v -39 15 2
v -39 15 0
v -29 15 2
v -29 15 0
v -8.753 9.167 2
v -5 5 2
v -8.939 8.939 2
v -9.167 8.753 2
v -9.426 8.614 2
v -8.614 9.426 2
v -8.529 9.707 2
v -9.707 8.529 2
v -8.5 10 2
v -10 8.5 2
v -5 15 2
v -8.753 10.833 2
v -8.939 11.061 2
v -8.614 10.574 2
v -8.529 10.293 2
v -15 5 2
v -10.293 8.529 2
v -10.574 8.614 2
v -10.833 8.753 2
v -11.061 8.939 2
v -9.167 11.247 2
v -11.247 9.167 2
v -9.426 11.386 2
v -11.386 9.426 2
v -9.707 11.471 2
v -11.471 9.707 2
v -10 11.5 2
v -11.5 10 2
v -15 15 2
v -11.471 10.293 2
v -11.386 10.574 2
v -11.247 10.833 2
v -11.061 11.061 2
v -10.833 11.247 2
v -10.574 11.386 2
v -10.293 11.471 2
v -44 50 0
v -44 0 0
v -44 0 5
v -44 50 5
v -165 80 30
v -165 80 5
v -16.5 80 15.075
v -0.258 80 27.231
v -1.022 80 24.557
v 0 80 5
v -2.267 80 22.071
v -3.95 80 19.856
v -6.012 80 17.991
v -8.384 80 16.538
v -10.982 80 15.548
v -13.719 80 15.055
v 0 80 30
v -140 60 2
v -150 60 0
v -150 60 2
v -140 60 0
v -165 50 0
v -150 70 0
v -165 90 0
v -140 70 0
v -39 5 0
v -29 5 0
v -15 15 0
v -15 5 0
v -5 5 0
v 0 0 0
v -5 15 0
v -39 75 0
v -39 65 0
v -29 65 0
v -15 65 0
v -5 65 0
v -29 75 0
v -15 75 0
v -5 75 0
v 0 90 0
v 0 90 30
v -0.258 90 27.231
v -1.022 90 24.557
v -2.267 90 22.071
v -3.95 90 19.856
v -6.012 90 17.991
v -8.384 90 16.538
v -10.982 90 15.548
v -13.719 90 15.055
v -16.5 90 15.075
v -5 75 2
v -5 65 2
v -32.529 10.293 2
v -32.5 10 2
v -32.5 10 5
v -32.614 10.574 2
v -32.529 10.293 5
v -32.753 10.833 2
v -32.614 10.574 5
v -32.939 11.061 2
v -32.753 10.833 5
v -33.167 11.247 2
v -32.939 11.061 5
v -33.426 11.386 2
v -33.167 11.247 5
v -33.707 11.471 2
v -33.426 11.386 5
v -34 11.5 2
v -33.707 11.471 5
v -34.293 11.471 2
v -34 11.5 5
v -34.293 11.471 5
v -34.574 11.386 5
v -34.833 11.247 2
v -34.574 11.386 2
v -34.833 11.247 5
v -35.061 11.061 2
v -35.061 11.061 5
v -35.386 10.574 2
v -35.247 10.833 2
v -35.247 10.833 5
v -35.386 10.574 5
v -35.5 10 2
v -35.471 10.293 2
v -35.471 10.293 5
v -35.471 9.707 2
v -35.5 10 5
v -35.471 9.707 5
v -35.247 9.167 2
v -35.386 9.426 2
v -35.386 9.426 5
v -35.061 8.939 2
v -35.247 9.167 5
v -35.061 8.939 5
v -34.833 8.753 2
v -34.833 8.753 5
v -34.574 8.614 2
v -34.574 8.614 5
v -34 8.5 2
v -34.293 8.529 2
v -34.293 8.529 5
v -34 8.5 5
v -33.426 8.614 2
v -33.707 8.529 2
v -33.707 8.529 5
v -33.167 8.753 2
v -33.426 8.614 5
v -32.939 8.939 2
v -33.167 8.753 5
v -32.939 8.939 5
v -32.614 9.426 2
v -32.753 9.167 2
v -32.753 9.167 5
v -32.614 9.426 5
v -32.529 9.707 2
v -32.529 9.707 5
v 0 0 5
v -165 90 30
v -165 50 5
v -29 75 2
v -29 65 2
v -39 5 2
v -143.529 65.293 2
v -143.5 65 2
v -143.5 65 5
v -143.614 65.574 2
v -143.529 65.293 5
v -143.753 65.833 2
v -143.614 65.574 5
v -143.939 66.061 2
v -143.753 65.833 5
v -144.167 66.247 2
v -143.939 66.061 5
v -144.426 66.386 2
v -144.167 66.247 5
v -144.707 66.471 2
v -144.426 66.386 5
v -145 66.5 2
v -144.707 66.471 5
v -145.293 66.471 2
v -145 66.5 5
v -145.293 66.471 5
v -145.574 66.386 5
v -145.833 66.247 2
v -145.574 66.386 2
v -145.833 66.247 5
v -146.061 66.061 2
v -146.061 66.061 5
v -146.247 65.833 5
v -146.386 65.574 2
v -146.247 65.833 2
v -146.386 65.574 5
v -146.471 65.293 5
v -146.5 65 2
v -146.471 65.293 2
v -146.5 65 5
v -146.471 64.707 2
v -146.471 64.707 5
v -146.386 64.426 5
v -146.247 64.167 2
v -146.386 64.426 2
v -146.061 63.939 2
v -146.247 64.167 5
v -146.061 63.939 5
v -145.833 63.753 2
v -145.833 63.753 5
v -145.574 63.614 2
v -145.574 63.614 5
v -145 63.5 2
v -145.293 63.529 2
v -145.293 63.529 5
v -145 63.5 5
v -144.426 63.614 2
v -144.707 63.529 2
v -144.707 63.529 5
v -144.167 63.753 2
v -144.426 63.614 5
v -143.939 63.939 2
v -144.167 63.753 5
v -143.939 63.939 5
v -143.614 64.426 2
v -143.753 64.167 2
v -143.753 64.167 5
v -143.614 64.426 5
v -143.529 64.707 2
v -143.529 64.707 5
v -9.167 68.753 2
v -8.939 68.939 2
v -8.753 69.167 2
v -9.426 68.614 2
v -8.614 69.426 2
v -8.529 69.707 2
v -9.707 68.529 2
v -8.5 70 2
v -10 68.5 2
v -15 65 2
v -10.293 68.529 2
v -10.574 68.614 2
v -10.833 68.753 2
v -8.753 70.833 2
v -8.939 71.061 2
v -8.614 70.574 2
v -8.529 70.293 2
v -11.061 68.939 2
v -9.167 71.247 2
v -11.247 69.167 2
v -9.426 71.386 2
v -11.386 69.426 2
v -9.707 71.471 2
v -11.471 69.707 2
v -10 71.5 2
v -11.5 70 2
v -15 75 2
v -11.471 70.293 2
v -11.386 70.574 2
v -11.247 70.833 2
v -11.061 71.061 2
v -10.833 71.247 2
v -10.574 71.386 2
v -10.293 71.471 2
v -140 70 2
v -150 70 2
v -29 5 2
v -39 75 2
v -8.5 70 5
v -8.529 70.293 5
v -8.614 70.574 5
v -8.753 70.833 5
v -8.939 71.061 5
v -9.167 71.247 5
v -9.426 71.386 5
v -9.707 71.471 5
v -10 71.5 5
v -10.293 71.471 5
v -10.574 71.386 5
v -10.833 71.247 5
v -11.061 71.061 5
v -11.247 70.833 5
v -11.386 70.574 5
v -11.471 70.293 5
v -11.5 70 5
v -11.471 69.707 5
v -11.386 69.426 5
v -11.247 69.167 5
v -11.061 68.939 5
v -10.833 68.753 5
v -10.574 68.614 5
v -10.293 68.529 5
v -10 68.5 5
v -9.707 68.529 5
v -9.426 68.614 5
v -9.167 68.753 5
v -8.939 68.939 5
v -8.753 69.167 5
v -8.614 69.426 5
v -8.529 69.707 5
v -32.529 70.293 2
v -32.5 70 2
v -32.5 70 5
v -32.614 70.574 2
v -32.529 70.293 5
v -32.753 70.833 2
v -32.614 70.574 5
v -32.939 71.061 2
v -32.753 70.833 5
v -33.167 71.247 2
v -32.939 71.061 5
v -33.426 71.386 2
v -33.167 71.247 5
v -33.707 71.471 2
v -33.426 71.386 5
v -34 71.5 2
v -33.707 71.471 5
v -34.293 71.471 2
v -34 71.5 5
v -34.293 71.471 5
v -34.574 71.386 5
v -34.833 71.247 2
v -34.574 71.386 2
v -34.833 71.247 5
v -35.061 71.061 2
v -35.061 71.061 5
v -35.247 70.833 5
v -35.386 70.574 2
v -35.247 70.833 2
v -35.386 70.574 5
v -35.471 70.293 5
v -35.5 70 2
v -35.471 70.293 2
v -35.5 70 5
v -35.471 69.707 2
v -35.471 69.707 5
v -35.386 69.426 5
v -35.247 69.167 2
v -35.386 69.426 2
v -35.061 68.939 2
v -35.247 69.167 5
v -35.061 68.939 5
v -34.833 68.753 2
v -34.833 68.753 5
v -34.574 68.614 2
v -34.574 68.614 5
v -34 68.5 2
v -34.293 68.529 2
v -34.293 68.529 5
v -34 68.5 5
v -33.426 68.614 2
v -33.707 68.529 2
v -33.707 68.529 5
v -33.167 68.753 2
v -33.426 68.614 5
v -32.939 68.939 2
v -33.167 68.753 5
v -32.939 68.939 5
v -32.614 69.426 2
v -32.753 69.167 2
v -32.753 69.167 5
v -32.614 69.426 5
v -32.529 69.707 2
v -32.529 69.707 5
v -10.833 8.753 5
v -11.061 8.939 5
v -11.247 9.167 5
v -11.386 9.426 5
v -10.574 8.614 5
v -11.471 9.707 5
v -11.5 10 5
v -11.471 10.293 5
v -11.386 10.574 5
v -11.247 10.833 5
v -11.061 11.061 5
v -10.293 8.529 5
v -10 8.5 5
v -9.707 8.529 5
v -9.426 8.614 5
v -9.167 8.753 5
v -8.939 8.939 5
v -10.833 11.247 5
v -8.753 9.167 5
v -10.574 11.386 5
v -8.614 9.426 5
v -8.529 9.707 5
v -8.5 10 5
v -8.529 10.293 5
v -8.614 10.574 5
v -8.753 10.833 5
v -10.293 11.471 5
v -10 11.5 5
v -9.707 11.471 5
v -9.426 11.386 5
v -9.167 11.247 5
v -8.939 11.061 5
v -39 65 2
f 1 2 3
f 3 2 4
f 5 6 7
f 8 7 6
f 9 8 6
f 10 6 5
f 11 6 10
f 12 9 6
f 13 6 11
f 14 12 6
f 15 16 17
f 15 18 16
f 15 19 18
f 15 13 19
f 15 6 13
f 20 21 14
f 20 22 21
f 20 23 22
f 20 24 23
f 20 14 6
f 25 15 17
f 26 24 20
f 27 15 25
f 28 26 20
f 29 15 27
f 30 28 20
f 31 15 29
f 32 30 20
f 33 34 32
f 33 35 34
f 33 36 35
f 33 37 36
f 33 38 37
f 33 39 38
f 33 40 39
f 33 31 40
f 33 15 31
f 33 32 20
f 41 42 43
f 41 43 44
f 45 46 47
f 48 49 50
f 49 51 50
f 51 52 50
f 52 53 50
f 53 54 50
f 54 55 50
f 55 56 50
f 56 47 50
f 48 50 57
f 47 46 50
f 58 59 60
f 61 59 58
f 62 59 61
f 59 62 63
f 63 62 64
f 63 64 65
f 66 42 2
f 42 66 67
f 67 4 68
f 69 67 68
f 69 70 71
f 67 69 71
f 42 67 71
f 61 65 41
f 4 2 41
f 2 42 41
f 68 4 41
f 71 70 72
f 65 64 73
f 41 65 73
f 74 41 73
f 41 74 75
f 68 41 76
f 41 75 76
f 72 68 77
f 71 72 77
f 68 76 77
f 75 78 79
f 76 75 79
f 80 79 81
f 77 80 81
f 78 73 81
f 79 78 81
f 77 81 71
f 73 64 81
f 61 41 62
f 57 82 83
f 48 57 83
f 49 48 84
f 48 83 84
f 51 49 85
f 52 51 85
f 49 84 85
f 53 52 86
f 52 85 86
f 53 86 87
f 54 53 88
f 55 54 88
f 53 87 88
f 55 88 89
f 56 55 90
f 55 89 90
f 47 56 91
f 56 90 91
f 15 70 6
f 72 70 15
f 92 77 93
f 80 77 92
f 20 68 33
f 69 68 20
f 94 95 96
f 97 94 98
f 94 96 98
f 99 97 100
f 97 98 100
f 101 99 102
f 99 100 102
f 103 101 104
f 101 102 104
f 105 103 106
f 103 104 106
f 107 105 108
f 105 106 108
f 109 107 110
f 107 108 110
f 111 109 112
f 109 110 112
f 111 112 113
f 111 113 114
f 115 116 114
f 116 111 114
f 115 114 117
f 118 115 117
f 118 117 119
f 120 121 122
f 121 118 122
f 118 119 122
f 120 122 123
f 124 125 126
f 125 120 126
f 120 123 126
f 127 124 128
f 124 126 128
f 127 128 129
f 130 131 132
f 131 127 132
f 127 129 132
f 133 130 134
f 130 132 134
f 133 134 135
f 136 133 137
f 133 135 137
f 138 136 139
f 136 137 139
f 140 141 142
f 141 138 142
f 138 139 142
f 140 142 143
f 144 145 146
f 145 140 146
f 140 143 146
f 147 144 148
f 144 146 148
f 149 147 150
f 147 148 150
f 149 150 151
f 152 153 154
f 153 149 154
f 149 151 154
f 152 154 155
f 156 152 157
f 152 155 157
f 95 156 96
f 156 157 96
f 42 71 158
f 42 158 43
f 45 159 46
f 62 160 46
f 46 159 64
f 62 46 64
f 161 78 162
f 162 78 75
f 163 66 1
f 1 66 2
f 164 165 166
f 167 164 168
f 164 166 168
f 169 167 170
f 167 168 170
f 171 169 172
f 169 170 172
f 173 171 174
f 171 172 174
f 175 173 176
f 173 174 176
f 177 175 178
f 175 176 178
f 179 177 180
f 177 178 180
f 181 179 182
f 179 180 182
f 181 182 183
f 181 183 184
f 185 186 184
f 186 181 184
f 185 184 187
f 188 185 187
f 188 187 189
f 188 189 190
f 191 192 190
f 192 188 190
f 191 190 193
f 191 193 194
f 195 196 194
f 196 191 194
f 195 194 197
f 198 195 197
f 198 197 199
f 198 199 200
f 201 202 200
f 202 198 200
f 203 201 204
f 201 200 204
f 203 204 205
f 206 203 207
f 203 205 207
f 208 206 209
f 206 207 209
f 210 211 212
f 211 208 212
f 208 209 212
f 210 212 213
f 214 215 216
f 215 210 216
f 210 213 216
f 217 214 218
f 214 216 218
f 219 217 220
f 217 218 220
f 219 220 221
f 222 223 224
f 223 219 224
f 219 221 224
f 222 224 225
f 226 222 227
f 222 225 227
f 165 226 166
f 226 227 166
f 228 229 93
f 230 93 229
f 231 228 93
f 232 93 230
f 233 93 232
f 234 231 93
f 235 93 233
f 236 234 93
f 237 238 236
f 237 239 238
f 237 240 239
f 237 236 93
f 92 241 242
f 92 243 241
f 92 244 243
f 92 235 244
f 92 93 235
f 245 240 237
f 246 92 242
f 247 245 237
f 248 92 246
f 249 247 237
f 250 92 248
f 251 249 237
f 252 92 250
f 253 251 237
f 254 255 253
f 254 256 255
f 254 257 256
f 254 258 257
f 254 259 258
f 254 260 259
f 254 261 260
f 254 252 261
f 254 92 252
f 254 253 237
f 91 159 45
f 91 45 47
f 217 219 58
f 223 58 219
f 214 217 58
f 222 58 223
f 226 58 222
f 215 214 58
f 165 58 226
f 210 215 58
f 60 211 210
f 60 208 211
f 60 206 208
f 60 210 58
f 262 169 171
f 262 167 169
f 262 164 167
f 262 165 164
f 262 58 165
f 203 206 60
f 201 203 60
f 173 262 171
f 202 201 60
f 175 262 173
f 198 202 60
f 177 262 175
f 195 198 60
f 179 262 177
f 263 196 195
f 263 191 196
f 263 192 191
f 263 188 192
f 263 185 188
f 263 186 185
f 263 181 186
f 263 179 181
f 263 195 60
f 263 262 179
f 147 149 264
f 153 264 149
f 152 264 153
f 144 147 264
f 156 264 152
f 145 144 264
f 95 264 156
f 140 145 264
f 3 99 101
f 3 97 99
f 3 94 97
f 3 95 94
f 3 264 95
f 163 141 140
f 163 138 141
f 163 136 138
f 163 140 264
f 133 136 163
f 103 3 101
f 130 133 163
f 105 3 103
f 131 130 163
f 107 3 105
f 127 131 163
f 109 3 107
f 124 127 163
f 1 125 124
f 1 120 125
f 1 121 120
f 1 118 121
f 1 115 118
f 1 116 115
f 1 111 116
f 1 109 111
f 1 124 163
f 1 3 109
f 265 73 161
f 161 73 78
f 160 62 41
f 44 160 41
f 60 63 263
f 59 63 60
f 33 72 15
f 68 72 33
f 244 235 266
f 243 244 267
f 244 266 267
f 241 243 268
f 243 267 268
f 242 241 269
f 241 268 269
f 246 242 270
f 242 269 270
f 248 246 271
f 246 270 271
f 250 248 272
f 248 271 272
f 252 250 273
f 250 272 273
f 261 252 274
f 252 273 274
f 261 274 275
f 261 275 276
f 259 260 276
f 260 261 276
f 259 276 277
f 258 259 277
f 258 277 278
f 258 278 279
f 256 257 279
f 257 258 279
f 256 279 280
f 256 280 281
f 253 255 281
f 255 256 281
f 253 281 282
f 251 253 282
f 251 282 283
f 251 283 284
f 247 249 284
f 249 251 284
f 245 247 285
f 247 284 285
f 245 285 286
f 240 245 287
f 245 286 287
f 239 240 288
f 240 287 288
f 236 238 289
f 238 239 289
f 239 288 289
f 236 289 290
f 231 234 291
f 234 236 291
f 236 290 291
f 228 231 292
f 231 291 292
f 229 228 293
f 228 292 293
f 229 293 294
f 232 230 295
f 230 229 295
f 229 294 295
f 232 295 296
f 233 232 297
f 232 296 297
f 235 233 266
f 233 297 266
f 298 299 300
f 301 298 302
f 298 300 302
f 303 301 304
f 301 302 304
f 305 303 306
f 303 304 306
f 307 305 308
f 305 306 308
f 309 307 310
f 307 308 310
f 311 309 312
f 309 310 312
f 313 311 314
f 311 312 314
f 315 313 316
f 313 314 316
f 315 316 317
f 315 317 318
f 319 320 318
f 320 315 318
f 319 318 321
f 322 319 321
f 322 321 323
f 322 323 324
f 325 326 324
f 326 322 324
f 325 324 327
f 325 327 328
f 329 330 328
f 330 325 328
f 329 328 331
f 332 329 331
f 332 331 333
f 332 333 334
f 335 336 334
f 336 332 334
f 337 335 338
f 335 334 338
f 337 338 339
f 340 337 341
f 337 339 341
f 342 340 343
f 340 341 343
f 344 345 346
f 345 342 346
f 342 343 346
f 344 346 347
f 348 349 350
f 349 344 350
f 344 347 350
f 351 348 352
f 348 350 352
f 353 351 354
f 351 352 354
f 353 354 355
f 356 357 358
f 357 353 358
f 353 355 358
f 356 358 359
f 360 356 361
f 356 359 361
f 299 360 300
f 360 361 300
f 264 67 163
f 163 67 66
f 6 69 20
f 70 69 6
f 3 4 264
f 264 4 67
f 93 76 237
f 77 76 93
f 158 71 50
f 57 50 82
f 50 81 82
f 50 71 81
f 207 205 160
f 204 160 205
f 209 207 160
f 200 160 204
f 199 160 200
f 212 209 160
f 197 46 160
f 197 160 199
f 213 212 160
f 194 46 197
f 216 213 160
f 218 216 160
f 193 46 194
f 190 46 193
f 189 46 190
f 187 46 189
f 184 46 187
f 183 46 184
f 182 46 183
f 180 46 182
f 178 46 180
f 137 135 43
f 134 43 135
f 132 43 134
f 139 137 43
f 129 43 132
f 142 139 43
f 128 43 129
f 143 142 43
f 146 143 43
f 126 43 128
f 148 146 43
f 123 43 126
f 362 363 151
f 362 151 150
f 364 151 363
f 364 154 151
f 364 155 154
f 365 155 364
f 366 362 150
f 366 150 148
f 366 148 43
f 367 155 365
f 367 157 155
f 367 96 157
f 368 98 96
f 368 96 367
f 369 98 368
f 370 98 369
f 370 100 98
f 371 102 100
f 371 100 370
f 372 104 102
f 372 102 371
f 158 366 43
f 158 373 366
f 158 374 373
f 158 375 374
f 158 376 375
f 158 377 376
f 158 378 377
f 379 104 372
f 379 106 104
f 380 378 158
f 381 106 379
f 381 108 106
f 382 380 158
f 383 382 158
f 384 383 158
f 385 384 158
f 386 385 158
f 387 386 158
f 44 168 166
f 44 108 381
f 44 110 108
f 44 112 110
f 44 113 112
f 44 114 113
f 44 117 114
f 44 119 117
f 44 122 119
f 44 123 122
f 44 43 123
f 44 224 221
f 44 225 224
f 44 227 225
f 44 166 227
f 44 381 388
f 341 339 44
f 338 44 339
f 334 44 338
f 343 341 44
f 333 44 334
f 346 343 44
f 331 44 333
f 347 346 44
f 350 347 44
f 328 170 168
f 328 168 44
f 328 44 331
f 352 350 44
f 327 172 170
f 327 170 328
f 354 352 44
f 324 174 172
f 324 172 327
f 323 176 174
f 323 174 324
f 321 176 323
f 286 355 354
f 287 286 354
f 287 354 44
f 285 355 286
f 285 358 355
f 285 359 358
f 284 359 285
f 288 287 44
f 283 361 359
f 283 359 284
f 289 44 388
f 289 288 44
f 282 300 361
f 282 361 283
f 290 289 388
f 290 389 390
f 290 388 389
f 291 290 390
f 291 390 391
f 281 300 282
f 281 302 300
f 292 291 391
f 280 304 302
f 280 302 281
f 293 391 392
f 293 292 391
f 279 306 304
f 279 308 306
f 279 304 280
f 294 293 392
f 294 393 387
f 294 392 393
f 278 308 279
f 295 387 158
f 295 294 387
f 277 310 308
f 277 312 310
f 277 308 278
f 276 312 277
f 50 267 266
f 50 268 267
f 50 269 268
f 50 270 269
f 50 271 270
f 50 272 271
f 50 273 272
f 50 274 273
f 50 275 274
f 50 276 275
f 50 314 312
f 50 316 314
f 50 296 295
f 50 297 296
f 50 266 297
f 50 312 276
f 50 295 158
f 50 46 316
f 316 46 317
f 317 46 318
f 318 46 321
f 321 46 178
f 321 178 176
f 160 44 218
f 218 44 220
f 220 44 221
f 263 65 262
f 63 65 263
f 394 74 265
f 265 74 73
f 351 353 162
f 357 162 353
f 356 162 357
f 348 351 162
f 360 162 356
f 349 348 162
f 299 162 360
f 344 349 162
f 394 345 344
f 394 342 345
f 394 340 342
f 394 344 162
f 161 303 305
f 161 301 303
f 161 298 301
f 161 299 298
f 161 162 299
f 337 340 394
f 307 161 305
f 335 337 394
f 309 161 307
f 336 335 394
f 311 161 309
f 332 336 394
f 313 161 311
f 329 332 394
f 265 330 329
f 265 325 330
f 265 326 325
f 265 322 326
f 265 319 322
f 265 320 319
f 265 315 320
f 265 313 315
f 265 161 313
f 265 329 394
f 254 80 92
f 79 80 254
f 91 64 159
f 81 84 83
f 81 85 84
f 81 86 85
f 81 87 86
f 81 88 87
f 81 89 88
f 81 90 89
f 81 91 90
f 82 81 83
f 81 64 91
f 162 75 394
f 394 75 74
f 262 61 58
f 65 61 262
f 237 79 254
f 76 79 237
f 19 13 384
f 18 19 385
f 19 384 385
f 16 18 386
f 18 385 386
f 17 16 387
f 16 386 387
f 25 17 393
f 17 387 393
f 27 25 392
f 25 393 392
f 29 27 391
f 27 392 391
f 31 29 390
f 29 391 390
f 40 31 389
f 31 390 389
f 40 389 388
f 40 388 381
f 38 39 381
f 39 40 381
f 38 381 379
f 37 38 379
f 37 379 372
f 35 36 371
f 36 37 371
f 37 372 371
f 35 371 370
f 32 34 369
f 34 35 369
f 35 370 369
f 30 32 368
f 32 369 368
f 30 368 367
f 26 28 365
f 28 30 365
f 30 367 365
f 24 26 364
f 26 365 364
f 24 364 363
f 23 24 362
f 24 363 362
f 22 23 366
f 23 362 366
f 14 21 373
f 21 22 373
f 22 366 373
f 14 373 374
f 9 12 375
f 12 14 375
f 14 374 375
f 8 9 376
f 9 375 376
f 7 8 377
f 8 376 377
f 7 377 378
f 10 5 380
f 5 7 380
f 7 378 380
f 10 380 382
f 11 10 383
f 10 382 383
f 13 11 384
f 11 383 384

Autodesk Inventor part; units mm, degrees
ref_plane "YZ Plane" through (0, 0, 0) normal (1, 0, 0) x (0, 1, 0)
ref_plane "XZ Plane" through (0, 0, 0) normal (0, 1, 0) x (-1, 0, 0)
sketch "Sketch1" plane through (0, 0, 0) normal (0, 0, 1) x (1, 0, 0)
  line L0 (0, 0) -> (-44, 0)
  line L1 (-44, 0) -> (-44, 90)
  line L2 (-44, 90) -> (0, 90)
  line L3 (0, 90) -> (0, 0)
  line L4 (-44, 90) -> (-165, 90)
  line L5 (-165, 90) -> (-165, 50)
  line L6 (-165, 50) -> (-44, 50)
  line L7 (-44, 50) -> (-44, 90)
  point P0 (-44, 50)
  dimension "d0" = 44
  dimension "d1" = 90
  dimension "d2" = 40
  dimension "d3" = 121
extrude "Extrusion1" add sketch "Sketch1" along normal blind 5
sketch "Sketch2" plane through (0, 0, 5) normal (0, 0, 1) x (1, 0, 0)
  point P0 (0, 0)
ref_plane "Work Plane1" through (-165, 90, 5) normal (0, 1, 0) x (1, 0, 0)
sketch "Sketch3" plane through (-165, 90, 5) normal (0, 1, 0) x (1, 0, 0)
  circle A0 centre (150, -25) radius 15
  arc A1 (7.1929, -25.7193) -> (7.1925, -24.2771) centre (0, -25) ccw
  line L0 (165, 0) -> (0.2186, 0)
  line L1 (165, 5) -> (165, -44.7143)
  line L2 (150, -40) -> (0, -25)
  line L3 (0, -25) -> (148.5, -10.0752)
  line L4 (0, 0) -> (121, 0) projected
  line L5 (165, -44.7143) -> (0, -44.7143)
  line L6 (0, -44.7143) -> (0, 0)
  line L7 (0, 0) -> (165, 0)
  line L8 (165, 0) -> (165, -44.7143)
  line L9 (0, 0) -> (0, -44.7143)
  point P0 (0, -25)
  point P1 (165, -25)
  dimension "d6" = 30
  dimension "d7" = 150
  dimension "d8" = 165
  dimension "d9" = 25
extrude "Extrusion2" add sketch "Sketch3" against normal blind 10 contours A0 L3 L6 L4 L0 L1
sketch "Sketch4" plane through (0, 0, 5) normal (0, 0, 1) x (1, 0, 0)
  line L0 (-5, 5) -> (-15, 5)
  line L1 (-15, 5) -> (-15, 15)
  line L2 (-15, 15) -> (-5, 15)
  line L3 (-5, 15) -> (-5, 5)
  line L4 (-5, 5) -> (-15, 15) construction
  line L5 (-15, 5) -> (-5, 15) construction
  line L6 (-44, 0) -> (0, 0) projected
  line L7 (0, 0) -> (0, 80) projected
  line L8 (-22, 0) -> (-22, 96.74)
  line L9 (0, 80) -> (-165, 80) projected
  line L10 (-39, 5) -> (-29, 5)
  line L11 (-29, 5) -> (-29, 15)
  line L12 (-29, 15) -> (-39, 15)
  line L13 (-39, 15) -> (-39, 5)
  line L14 (-5, 65) -> (-15, 65)
  line L15 (-15, 65) -> (-15, 75)
  line L16 (-15, 75) -> (-5, 75)
  line L17 (-5, 75) -> (-5, 65)
  line L18 (-5, 65) -> (-15, 75) construction
  line L19 (-15, 65) -> (-5, 75) construction
  line L20 (-39, 65) -> (-29, 65)
  line L21 (-29, 65) -> (-29, 75)
  line L22 (-29, 75) -> (-39, 75)
  line L23 (-39, 75) -> (-39, 65)
  line L24 (-140, 60) -> (-150, 60)
  line L25 (-150, 60) -> (-150, 70)
  line L26 (-150, 70) -> (-140, 70)
  line L27 (-140, 70) -> (-140, 60)
  line L28 (-140, 60) -> (-150, 70) construction
  line L29 (-150, 60) -> (-140, 70) construction
  line L30 (-165, 50) -> (-44, 50) projected
  line L31 (-165, 80) -> (-165, 50) projected
  circle A0 centre (-10, 10) radius 1.5
  circle A1 centre (-10, 70) radius 1.5
  circle A2 centre (-34, 10) radius 1.5
  circle A3 centre (-34, 70) radius 1.5
  circle A4 centre (-145, 65) radius 1.5
  dimension "d12" = 10
  dimension "d13" = 10
  dimension "d14" = 10
  dimension "d15" = 10
  dimension "d16" = 10
  dimension "d17" = 10
  dimension "d18" = 10
  dimension "d19" = 10
  dimension "d20" = 10
  dimension "d21" = 15
  dimension "d22" = 20
  dimension "d23" = 3
  dimension "d24" = 3
  dimension "d25" = 3
extrude "Extrusion3" cut sketch "Sketch4" against normal through all contours A0 | A1
extrude "Extrusion4" cut sketch "Sketch4" against normal through all contours A3
extrude "Extrusion5" cut sketch "Sketch4" against normal through all contours A2
extrude "Extrusion6" cut sketch "Sketch4" against normal through all contours A4
sketch "Sketch5" plane through (0, 0, 0) normal (0, 0, -1) x (-1, 0, 0)
  line L0 (5, 15) -> (15, 15)
  line L1 (15, 15) -> (15, 5)
  line L2 (15, 5) -> (5, 5)
  line L3 (5, 5) -> (5, 15)
  circle A0 centre (10, 10) radius 1.5 projected
  line L4 (5, 15) -> (15, 5) construction
  line L5 (15, 15) -> (5, 5) construction
  line L6 (5, 75) -> (15, 75)
  line L7 (15, 75) -> (15, 65)
  line L8 (15, 65) -> (5, 65)
  line L9 (5, 65) -> (5, 75)
  circle A1 centre (10, 70) radius 1.5 projected
  line L10 (5, 75) -> (15, 65) construction
  line L11 (15, 75) -> (5, 65) construction
  line L12 (44, 0) -> (0, 0) projected
  line L13 (22, 0) -> (22, 89.9769)
  line L14 (39, 15) -> (29, 15)
  line L15 (29, 15) -> (29, 5)
  line L16 (29, 5) -> (39, 5)
  line L17 (39, 5) -> (39, 15)
  circle A2 centre (34, 10) radius 1.5
  line L18 (39, 15) -> (29, 5) construction
  line L19 (29, 15) -> (39, 5) construction
  line L20 (39, 75) -> (29, 75)
  line L21 (29, 75) -> (29, 65)
  line L22 (29, 65) -> (39, 65)
  line L23 (39, 65) -> (39, 75)
  circle A3 centre (34, 70) radius 1.5
  line L24 (39, 75) -> (29, 65) construction
  line L25 (29, 75) -> (39, 65) construction
  line L26 (140, 70) -> (150, 70)
  line L27 (150, 70) -> (150, 60)
  line L28 (150, 60) -> (140, 60)
  line L29 (140, 60) -> (140, 70)
  circle A4 centre (145, 65) radius 1.5 projected
  line L30 (140, 70) -> (150, 60) construction
  line L31 (150, 70) -> (140, 60) construction
  circle A5 centre (10, 10) radius 1.5
  circle A6 centre (10, 70) radius 1.5
  circle A7 centre (34, 70) radius 1.5
  circle A8 centre (34, 10) radius 1.5
  circle A9 centre (145, 65) radius 1.5
  dimension "d34" = 10
  dimension "d35" = 10
  dimension "d36" = 10
  dimension "d37" = 10
  dimension "d38" = 10
  dimension "d39" = 10
  dimension "d40" = 3
  dimension "d41" = 3
  dimension "d42" = 3
  dimension "d43" = 3
  dimension "d44" = 3
extrude "Extrusion7" cut sketch "Sketch5" against normal blind 2
properties part number "üst kısım"
